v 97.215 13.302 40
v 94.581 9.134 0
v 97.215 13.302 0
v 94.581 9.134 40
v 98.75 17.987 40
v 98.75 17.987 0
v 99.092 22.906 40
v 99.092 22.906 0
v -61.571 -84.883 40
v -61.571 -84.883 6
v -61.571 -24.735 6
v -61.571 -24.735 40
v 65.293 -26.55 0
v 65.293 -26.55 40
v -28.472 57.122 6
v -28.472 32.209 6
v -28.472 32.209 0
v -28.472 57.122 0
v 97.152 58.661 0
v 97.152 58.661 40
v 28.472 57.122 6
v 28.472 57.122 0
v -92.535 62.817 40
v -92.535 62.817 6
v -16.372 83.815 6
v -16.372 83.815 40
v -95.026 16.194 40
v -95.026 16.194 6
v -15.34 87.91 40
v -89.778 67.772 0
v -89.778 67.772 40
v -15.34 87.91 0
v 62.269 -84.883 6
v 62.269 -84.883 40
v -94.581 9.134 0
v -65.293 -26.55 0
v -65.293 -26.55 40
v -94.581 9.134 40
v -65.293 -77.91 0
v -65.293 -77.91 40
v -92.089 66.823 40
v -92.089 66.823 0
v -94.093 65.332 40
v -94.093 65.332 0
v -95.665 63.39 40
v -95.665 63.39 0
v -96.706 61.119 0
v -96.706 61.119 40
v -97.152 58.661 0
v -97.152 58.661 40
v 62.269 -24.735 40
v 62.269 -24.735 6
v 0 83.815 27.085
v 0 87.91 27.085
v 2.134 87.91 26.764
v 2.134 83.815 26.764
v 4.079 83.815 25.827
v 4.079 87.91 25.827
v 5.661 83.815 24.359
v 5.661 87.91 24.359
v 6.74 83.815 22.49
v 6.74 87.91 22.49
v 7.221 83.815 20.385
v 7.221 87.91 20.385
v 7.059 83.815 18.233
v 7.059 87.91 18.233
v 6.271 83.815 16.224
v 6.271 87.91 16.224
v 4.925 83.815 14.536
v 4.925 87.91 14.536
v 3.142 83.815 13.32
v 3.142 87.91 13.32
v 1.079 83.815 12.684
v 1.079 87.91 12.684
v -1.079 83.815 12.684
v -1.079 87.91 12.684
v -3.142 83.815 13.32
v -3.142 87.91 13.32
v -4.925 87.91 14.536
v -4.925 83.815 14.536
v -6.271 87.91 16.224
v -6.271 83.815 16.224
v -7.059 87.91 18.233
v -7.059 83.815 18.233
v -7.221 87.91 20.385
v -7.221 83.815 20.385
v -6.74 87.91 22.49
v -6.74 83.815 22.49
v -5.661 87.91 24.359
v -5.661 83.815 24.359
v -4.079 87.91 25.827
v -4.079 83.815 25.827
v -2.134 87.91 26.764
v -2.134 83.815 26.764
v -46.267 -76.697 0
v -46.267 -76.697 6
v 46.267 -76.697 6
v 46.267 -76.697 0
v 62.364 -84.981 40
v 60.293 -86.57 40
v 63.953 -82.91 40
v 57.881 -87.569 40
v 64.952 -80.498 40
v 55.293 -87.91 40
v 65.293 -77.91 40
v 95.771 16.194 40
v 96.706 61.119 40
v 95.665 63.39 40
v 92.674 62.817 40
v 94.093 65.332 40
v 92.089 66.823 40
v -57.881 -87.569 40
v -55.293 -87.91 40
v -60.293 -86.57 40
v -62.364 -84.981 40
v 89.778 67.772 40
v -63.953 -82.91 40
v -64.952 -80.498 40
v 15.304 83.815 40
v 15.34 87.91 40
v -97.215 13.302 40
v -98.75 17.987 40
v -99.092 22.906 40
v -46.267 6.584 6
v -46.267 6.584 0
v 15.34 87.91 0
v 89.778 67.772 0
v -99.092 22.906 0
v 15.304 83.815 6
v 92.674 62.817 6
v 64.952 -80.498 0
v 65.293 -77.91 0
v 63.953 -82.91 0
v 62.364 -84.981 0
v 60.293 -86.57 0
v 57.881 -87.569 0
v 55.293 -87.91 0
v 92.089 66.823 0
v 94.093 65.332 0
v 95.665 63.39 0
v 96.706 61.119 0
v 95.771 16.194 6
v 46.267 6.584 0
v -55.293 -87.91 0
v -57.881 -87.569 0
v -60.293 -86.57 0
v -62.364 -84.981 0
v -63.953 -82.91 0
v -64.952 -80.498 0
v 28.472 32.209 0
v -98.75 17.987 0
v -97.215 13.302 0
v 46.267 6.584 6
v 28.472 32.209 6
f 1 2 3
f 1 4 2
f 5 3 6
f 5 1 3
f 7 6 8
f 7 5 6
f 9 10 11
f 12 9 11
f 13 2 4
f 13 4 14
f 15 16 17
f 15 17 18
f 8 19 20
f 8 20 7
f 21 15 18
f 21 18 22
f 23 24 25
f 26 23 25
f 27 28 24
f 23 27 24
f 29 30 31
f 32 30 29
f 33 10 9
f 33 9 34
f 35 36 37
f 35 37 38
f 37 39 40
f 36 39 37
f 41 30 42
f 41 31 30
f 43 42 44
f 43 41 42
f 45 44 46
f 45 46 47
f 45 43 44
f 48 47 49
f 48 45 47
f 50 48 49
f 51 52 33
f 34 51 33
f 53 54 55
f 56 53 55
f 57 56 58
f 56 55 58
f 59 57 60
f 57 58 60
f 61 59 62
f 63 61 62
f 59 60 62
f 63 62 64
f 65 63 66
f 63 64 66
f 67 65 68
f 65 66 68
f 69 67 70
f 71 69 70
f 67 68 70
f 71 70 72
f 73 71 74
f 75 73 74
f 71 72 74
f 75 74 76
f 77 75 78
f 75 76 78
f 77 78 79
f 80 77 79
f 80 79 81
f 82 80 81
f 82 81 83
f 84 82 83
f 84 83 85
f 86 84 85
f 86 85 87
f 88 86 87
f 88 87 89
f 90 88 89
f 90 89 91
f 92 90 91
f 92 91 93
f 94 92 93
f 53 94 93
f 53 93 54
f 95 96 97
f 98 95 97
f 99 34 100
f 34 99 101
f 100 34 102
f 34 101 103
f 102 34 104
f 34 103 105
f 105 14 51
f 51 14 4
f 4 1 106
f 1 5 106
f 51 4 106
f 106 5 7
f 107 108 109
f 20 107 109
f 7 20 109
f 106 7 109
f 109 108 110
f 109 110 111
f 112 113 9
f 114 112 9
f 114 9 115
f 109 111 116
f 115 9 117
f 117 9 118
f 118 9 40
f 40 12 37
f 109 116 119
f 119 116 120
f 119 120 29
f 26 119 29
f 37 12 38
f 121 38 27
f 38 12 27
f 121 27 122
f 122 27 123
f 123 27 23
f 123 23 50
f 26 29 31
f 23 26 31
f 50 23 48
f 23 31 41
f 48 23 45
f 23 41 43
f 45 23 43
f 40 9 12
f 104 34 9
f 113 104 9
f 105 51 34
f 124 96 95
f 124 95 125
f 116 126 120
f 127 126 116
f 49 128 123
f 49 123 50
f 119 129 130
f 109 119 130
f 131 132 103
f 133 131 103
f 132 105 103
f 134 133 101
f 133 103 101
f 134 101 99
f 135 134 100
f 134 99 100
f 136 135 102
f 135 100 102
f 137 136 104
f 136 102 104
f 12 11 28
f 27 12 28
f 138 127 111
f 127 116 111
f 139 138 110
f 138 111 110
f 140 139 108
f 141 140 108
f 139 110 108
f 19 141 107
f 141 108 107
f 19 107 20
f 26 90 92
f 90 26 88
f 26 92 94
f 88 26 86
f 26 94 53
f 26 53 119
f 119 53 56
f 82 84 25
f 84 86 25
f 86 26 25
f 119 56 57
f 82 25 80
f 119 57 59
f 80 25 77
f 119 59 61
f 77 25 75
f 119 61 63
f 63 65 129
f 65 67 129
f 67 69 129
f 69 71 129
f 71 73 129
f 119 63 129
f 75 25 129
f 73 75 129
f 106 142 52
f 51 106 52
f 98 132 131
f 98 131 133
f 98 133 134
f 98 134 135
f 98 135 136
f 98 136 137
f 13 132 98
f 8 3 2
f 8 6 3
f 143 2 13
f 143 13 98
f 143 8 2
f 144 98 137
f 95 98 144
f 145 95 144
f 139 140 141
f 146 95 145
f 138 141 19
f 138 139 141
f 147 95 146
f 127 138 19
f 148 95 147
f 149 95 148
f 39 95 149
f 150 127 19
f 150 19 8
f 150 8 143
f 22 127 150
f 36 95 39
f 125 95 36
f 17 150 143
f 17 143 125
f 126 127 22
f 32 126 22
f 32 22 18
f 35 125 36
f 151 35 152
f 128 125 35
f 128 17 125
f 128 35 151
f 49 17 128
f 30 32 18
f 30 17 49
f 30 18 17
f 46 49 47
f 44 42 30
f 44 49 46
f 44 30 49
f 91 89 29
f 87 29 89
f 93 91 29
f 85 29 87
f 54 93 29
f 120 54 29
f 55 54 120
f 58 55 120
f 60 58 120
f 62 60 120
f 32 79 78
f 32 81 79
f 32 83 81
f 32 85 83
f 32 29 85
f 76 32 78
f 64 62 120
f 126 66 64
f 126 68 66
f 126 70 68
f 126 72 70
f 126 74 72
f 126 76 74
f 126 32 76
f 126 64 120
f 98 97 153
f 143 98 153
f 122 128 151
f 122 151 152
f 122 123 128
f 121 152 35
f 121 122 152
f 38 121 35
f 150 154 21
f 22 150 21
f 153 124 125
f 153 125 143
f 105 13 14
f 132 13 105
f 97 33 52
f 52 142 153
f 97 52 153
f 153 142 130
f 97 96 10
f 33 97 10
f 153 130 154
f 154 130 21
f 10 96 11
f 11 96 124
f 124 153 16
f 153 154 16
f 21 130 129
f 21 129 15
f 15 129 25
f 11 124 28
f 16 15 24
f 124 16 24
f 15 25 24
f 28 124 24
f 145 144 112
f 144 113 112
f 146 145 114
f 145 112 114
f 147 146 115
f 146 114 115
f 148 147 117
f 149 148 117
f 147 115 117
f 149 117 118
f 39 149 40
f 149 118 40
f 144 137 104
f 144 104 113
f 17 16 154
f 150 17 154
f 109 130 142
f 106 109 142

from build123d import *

# Parameters (mm, degrees)
BOSS_EXTRUDE1_DEPTH     = 40
CUT_EXTRUDE1_DEPTH      = 2
CUT_EXTRUDE1_DEPTH_BACK = 34
SKETCH5_R               = 7.241016292
CUT_EXTRUDE2_DEPTH      = 19
SKETCH4_W               = 56.944481184
SKETCH4_H               = 24.913210518
SKETCH4_W_2             = 92.534781926
SKETCH4_H_2             = 83.281303733
CUT_EXTRUDE3_DEPTH      = 19
FILLET1_R               = 10
FILLET2_R               = 10
FILLET5_R               = 20
FILLET6_R               = 20
FILLET11_R              = 10
FILLET12_R              = 10


with BuildPart() as part:
    # Sketch1 → Boss-Extrude1 (new body)
    with BuildSketch(Plane.XY):
        Polygon((-15.339960816, 87.909775446), (15.339960816, 87.909775446), (96.75975284, 65.883165043), (99.51307914, 15.143294652), (65.29316655, -26.549932182), (65.29316655, -87.909775446), (-65.29316655, -87.909775446), (-65.29316655, -26.549932182), (-99.51307914, 15.143294652), (-96.75975284, 65.883165043), align=None)
    extrude(amount=BOSS_EXTRUDE1_DEPTH)

    # Sketch3 → Cut-Extrude1 (cut, two sides: drawn at the far end of the back side and taken through both)
    with BuildSketch(Plane.XY.offset(40).offset(-CUT_EXTRUDE1_DEPTH_BACK)):
        Polygon((-92.534781925, 62.816880807), (-16.371538341, 83.815158244), (15.303829318, 83.815158244), (92.673798797, 62.816880807), (95.770608339, 16.193586837), (62.268759659, -24.735259015), (62.268759659, -84.882867266), (60.147608251, -84.882867266), (-61.571220281, -84.882867266), (-61.571220281, -24.735259015), (-95.026102977, 16.193586837), align=None)
    extrude(amount=CUT_EXTRUDE1_DEPTH + CUT_EXTRUDE1_DEPTH_BACK, mode=Mode.SUBTRACT)

    # Sketch5 → Cut-Extrude2 (cut)
    with BuildSketch(Plane(origin=(0, 87.909775446, 0), x_dir=(1, 0, 0), z_dir=(0, 1, 0))):
        with Locations(Location((0, -19.844342197, 0), (0, 0, 270))):
            Circle(SKETCH5_R)
    extrude(amount=-CUT_EXTRUDE2_DEPTH, mode=Mode.SUBTRACT)

    # Sketch4 → Cut-Extrude3 (cut)
    with BuildSketch(Plane.XY.offset(6)):
        with Locations((0, 44.665827429)):
            Rectangle(SKETCH4_W, SKETCH4_H)
        with Locations((0, -35.05644623)):
            Rectangle(SKETCH4_W_2, SKETCH4_H_2)
    extrude(amount=-CUT_EXTRUDE3_DEPTH, mode=Mode.SUBTRACT)

    # Fillet1
    fillet1_edges = [part.edges().sort_by_distance(p)[0] for p in [
        (96.75975284, 65.883165043, 20),
    ]]
    fillet(fillet1_edges, radius=FILLET1_R)

    # Fillet2
    fillet2_edges = [part.edges().sort_by_distance(p)[0] for p in [
        (-96.75975284, 65.883165043, 20),
    ]]
    fillet(fillet2_edges, radius=FILLET2_R)

    # Fillet5
    fillet5_edges = [part.edges().sort_by_distance(p)[0] for p in [
        (-99.51307914, 15.143294652, 20),
    ]]
    fillet(fillet5_edges, radius=FILLET5_R)

    # Fillet6
    fillet6_edges = [part.edges().sort_by_distance(p)[0] for p in [
        (99.51307914, 15.143294652, 20),
    ]]
    fillet(fillet6_edges, radius=FILLET6_R)

    # Fillet11
    fillet11_edges = [part.edges().sort_by_distance(p)[0] for p in [
        (65.29316655, -87.909775446, 20),
    ]]
    fillet(fillet11_edges, radius=FILLET11_R)

    # Fillet12
    fillet12_edges = [part.edges().sort_by_distance(p)[0] for p in [
        (-65.29316655, -87.909775446, 20),
    ]]
    fillet(fillet12_edges, radius=FILLET12_R)


solid = part.part
